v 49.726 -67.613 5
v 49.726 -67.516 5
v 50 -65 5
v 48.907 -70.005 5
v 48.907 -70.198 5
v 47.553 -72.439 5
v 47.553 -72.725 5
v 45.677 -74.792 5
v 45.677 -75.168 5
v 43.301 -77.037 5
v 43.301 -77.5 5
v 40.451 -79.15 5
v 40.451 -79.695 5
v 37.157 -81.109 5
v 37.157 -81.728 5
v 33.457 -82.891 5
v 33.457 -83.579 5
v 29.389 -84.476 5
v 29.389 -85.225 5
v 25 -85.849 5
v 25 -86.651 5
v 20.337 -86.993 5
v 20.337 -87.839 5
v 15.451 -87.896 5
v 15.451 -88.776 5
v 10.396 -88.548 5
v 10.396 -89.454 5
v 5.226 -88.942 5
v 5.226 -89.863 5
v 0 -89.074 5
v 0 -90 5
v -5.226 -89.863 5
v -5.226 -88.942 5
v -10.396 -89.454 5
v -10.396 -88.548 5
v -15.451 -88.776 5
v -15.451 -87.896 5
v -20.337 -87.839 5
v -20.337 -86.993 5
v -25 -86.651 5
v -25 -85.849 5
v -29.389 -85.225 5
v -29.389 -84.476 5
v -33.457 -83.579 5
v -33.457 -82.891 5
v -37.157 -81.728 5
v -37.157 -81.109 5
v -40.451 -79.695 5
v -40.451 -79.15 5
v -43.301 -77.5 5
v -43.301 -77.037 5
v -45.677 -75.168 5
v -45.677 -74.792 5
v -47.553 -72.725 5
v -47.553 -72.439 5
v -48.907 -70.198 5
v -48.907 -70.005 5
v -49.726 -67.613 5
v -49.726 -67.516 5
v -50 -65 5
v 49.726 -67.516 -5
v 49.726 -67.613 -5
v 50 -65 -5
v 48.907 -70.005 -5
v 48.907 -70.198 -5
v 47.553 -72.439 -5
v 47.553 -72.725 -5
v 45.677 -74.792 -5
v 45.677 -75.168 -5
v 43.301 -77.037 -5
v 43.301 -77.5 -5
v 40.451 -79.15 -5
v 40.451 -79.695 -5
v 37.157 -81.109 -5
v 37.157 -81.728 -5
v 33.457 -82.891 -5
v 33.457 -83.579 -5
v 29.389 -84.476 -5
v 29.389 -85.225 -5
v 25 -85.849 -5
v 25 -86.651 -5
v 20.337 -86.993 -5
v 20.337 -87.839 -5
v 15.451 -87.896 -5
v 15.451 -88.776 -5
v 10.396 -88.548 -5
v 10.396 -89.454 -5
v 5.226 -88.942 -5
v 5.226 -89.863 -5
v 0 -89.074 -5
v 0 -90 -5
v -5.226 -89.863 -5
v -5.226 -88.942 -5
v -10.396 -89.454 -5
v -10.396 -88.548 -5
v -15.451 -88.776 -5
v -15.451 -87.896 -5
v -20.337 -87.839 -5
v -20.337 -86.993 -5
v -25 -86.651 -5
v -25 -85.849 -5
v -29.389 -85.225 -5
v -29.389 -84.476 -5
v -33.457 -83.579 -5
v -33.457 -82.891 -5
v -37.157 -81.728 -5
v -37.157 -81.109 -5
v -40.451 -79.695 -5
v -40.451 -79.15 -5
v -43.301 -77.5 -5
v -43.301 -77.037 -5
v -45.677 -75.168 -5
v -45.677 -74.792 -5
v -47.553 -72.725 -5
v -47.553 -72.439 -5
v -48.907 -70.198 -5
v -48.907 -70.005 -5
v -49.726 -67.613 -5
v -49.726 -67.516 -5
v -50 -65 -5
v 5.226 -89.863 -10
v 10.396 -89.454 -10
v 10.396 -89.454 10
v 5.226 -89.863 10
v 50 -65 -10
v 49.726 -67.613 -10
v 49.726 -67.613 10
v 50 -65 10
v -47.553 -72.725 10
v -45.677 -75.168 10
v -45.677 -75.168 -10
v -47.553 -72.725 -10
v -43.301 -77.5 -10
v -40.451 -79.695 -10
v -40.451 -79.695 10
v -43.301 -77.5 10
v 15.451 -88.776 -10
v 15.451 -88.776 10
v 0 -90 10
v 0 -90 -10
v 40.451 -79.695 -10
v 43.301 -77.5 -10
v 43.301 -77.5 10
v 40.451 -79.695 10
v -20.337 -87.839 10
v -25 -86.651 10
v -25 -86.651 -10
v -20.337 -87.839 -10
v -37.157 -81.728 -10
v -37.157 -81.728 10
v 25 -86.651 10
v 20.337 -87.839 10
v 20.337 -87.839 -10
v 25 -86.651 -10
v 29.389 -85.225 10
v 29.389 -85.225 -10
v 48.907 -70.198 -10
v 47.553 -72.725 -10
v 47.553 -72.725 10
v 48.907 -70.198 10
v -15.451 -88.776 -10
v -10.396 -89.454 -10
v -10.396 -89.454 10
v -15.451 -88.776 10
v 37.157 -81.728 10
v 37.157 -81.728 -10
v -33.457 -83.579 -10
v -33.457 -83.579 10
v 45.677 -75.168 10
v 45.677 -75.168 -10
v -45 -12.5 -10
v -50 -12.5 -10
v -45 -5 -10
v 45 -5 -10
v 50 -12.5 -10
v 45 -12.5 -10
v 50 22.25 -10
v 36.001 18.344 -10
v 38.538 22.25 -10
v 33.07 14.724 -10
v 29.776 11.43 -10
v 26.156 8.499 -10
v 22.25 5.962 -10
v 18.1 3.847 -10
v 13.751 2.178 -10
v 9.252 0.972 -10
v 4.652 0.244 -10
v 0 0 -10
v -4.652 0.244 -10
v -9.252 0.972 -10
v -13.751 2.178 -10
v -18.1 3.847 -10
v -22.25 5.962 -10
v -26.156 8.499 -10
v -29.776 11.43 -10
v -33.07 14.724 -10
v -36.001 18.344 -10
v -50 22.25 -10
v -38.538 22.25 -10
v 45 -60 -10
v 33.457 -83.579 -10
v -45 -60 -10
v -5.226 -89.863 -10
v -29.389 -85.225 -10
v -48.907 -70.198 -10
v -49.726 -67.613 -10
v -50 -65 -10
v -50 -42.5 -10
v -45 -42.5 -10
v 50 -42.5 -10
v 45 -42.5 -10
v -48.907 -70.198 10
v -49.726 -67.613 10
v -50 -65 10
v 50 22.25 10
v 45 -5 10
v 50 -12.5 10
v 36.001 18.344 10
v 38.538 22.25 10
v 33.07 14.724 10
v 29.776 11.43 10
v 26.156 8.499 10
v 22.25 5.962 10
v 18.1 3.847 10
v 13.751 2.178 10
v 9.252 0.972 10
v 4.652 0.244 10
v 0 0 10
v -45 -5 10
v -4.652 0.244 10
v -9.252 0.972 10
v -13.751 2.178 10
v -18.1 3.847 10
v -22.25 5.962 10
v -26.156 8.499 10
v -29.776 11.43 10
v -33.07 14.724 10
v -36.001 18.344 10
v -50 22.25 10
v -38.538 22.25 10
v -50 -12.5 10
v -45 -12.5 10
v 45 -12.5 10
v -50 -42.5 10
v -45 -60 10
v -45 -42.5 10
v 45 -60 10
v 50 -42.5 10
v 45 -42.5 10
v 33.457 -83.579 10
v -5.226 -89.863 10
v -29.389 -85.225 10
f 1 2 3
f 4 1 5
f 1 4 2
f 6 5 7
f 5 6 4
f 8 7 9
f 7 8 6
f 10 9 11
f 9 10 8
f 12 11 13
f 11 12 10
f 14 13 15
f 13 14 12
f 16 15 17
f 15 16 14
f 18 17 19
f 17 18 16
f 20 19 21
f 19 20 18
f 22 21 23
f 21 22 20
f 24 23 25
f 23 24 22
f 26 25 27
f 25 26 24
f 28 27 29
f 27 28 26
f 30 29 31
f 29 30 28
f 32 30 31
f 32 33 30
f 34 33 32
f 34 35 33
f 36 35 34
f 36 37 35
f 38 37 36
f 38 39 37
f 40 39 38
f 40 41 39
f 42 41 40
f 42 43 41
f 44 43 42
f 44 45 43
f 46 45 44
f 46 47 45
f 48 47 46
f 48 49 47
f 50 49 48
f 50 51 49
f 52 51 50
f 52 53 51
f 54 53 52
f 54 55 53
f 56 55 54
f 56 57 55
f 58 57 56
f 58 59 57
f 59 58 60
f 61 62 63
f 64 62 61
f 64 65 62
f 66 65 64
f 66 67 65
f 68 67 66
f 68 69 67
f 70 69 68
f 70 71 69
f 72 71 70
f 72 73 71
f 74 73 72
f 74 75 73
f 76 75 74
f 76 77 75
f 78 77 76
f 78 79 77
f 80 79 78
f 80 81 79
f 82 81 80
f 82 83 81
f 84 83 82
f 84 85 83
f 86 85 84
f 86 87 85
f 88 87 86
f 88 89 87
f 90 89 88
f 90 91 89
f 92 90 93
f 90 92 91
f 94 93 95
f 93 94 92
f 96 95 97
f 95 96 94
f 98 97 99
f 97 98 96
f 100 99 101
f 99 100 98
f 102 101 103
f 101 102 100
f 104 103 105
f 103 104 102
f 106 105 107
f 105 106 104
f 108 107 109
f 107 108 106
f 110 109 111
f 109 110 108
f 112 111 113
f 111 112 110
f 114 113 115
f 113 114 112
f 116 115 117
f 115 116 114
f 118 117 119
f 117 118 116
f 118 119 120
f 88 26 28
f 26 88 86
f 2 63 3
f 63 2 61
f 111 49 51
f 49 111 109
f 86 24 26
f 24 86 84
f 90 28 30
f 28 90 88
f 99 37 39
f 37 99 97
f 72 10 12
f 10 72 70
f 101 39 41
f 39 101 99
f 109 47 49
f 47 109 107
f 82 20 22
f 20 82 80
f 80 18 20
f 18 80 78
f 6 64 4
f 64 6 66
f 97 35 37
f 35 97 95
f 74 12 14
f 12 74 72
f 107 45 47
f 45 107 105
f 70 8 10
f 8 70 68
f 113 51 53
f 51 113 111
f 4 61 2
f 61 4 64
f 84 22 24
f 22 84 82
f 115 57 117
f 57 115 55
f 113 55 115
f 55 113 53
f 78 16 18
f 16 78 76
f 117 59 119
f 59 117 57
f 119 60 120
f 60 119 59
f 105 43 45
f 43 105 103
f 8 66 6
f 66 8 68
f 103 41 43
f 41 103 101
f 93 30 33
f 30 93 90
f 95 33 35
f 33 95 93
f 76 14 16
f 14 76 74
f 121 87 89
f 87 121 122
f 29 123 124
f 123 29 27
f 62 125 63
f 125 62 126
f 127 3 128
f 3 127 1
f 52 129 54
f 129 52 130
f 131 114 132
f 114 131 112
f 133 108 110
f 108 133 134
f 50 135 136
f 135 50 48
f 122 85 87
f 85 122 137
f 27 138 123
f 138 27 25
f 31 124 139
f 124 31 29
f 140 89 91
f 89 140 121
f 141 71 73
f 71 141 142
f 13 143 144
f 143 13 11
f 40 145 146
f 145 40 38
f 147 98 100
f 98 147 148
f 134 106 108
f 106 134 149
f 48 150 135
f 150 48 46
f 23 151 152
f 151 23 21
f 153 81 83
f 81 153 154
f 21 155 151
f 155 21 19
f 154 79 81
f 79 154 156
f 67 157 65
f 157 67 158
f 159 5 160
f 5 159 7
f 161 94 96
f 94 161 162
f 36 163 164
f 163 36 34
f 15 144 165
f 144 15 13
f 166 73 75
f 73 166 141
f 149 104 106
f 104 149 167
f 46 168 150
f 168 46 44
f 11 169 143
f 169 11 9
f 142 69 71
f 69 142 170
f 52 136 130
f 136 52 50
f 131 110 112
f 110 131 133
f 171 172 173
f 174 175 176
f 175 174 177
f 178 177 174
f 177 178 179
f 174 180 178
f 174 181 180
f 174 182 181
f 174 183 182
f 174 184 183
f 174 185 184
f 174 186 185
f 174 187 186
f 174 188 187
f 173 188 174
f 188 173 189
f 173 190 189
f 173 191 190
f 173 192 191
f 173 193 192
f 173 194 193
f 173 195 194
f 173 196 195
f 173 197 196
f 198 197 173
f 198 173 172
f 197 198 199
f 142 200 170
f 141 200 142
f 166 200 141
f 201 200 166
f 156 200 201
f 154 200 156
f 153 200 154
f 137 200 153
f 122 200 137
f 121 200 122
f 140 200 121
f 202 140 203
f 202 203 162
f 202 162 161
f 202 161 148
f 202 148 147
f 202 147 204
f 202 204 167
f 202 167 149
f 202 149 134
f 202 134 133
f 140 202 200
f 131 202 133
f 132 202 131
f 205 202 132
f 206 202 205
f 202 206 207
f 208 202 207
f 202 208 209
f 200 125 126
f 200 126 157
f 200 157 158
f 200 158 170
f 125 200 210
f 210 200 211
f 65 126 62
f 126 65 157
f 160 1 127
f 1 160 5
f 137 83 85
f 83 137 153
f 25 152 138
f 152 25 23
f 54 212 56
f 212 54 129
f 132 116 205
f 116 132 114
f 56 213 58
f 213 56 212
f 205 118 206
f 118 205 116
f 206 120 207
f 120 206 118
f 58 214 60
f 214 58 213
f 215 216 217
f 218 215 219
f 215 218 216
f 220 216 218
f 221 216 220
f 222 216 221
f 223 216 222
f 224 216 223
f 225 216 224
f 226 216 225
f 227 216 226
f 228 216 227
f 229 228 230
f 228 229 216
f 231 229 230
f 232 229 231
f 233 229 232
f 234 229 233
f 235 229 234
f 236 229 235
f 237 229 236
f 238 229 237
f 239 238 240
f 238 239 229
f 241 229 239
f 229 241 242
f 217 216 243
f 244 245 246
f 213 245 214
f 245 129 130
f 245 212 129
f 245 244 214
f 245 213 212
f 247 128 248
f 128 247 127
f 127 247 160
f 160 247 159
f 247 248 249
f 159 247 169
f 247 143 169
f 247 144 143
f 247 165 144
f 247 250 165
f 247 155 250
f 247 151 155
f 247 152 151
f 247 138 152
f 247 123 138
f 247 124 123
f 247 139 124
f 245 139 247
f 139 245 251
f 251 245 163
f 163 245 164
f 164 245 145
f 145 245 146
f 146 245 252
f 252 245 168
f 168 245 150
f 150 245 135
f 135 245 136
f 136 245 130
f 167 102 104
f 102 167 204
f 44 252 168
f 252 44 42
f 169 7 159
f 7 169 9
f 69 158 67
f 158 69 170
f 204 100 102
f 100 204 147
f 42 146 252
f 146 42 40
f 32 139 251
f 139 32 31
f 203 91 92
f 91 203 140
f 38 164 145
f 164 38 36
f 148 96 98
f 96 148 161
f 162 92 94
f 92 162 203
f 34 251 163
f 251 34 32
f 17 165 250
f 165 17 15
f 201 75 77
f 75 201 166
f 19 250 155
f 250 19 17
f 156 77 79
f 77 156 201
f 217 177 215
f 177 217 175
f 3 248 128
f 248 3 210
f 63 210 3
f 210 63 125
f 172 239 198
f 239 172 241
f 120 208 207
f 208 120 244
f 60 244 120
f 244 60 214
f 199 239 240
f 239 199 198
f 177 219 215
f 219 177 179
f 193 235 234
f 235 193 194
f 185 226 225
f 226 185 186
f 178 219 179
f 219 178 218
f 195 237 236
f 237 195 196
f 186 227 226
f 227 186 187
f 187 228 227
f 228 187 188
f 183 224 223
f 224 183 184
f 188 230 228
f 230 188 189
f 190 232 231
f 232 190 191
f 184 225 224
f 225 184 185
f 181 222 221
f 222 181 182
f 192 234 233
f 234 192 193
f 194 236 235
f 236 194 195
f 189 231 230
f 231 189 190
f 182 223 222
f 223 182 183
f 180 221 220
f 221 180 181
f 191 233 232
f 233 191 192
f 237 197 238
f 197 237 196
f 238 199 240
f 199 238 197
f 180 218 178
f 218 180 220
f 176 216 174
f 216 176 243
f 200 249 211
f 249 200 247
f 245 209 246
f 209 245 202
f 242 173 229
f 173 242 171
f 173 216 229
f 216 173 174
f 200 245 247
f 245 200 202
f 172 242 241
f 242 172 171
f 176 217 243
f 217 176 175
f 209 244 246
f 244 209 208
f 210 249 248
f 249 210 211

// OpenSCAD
$fn = 60;

box_size = [90, 55, 115];
pole_size = 89;
strap_width = 10;
strap_depth = 4;

wall_size = 5;
collar_box = [
    box_size[0] + wall_size * 2,
    box_size[1] + pole_size / 4 + wall_size * 2,
    strap_width + wall_size * 2
];

module ring (d, h, thick) {
    difference() {
        cylinder(d=d, h=h, center=true);
        cylinder(d=d-thick, h=h+1, center=true);
    }
}

module strap_and_curve() {
    scale([1,.5,1]) {
        difference() {
            cylinder(d=collar_box[0], h=collar_box[2], center=true);
            resize([0,collar_box[0]+strap_depth,0]) ring(d=collar_box[0]+strap_depth*2, h=strap_width, thick=strap_depth*2);
            translate([0,collar_box[0]/4+1,0]) cube([collar_box[0]+1,collar_box[0]/2+1,collar_box[2]+1], center=true);
        }
    }
}

%translate ([0,-box_size[1]/2-wall_size,0]) cube(box_size, center=true);
difference() {
    union() {
        translate([0,-collar_box[1]/2+pole_size/4,0]) cube(collar_box, center=true);
        // now add the strap groove
        translate([0,-box_size[1]-wall_size*2,0]) strap_and_curve();
    }

    // pole
    translate([0,pole_size/2,0]) cylinder(d=pole_size, h=400, center=true);

    // box
    translate([0,-box_size[1]/2 - wall_size,0]) cube(box_size, center=true);

    // Cut into two parts
    translate([0,-box_size[1]/2,0]) cube([collar_box[0]+1,30,collar_box[2]+1], center = true);
}
